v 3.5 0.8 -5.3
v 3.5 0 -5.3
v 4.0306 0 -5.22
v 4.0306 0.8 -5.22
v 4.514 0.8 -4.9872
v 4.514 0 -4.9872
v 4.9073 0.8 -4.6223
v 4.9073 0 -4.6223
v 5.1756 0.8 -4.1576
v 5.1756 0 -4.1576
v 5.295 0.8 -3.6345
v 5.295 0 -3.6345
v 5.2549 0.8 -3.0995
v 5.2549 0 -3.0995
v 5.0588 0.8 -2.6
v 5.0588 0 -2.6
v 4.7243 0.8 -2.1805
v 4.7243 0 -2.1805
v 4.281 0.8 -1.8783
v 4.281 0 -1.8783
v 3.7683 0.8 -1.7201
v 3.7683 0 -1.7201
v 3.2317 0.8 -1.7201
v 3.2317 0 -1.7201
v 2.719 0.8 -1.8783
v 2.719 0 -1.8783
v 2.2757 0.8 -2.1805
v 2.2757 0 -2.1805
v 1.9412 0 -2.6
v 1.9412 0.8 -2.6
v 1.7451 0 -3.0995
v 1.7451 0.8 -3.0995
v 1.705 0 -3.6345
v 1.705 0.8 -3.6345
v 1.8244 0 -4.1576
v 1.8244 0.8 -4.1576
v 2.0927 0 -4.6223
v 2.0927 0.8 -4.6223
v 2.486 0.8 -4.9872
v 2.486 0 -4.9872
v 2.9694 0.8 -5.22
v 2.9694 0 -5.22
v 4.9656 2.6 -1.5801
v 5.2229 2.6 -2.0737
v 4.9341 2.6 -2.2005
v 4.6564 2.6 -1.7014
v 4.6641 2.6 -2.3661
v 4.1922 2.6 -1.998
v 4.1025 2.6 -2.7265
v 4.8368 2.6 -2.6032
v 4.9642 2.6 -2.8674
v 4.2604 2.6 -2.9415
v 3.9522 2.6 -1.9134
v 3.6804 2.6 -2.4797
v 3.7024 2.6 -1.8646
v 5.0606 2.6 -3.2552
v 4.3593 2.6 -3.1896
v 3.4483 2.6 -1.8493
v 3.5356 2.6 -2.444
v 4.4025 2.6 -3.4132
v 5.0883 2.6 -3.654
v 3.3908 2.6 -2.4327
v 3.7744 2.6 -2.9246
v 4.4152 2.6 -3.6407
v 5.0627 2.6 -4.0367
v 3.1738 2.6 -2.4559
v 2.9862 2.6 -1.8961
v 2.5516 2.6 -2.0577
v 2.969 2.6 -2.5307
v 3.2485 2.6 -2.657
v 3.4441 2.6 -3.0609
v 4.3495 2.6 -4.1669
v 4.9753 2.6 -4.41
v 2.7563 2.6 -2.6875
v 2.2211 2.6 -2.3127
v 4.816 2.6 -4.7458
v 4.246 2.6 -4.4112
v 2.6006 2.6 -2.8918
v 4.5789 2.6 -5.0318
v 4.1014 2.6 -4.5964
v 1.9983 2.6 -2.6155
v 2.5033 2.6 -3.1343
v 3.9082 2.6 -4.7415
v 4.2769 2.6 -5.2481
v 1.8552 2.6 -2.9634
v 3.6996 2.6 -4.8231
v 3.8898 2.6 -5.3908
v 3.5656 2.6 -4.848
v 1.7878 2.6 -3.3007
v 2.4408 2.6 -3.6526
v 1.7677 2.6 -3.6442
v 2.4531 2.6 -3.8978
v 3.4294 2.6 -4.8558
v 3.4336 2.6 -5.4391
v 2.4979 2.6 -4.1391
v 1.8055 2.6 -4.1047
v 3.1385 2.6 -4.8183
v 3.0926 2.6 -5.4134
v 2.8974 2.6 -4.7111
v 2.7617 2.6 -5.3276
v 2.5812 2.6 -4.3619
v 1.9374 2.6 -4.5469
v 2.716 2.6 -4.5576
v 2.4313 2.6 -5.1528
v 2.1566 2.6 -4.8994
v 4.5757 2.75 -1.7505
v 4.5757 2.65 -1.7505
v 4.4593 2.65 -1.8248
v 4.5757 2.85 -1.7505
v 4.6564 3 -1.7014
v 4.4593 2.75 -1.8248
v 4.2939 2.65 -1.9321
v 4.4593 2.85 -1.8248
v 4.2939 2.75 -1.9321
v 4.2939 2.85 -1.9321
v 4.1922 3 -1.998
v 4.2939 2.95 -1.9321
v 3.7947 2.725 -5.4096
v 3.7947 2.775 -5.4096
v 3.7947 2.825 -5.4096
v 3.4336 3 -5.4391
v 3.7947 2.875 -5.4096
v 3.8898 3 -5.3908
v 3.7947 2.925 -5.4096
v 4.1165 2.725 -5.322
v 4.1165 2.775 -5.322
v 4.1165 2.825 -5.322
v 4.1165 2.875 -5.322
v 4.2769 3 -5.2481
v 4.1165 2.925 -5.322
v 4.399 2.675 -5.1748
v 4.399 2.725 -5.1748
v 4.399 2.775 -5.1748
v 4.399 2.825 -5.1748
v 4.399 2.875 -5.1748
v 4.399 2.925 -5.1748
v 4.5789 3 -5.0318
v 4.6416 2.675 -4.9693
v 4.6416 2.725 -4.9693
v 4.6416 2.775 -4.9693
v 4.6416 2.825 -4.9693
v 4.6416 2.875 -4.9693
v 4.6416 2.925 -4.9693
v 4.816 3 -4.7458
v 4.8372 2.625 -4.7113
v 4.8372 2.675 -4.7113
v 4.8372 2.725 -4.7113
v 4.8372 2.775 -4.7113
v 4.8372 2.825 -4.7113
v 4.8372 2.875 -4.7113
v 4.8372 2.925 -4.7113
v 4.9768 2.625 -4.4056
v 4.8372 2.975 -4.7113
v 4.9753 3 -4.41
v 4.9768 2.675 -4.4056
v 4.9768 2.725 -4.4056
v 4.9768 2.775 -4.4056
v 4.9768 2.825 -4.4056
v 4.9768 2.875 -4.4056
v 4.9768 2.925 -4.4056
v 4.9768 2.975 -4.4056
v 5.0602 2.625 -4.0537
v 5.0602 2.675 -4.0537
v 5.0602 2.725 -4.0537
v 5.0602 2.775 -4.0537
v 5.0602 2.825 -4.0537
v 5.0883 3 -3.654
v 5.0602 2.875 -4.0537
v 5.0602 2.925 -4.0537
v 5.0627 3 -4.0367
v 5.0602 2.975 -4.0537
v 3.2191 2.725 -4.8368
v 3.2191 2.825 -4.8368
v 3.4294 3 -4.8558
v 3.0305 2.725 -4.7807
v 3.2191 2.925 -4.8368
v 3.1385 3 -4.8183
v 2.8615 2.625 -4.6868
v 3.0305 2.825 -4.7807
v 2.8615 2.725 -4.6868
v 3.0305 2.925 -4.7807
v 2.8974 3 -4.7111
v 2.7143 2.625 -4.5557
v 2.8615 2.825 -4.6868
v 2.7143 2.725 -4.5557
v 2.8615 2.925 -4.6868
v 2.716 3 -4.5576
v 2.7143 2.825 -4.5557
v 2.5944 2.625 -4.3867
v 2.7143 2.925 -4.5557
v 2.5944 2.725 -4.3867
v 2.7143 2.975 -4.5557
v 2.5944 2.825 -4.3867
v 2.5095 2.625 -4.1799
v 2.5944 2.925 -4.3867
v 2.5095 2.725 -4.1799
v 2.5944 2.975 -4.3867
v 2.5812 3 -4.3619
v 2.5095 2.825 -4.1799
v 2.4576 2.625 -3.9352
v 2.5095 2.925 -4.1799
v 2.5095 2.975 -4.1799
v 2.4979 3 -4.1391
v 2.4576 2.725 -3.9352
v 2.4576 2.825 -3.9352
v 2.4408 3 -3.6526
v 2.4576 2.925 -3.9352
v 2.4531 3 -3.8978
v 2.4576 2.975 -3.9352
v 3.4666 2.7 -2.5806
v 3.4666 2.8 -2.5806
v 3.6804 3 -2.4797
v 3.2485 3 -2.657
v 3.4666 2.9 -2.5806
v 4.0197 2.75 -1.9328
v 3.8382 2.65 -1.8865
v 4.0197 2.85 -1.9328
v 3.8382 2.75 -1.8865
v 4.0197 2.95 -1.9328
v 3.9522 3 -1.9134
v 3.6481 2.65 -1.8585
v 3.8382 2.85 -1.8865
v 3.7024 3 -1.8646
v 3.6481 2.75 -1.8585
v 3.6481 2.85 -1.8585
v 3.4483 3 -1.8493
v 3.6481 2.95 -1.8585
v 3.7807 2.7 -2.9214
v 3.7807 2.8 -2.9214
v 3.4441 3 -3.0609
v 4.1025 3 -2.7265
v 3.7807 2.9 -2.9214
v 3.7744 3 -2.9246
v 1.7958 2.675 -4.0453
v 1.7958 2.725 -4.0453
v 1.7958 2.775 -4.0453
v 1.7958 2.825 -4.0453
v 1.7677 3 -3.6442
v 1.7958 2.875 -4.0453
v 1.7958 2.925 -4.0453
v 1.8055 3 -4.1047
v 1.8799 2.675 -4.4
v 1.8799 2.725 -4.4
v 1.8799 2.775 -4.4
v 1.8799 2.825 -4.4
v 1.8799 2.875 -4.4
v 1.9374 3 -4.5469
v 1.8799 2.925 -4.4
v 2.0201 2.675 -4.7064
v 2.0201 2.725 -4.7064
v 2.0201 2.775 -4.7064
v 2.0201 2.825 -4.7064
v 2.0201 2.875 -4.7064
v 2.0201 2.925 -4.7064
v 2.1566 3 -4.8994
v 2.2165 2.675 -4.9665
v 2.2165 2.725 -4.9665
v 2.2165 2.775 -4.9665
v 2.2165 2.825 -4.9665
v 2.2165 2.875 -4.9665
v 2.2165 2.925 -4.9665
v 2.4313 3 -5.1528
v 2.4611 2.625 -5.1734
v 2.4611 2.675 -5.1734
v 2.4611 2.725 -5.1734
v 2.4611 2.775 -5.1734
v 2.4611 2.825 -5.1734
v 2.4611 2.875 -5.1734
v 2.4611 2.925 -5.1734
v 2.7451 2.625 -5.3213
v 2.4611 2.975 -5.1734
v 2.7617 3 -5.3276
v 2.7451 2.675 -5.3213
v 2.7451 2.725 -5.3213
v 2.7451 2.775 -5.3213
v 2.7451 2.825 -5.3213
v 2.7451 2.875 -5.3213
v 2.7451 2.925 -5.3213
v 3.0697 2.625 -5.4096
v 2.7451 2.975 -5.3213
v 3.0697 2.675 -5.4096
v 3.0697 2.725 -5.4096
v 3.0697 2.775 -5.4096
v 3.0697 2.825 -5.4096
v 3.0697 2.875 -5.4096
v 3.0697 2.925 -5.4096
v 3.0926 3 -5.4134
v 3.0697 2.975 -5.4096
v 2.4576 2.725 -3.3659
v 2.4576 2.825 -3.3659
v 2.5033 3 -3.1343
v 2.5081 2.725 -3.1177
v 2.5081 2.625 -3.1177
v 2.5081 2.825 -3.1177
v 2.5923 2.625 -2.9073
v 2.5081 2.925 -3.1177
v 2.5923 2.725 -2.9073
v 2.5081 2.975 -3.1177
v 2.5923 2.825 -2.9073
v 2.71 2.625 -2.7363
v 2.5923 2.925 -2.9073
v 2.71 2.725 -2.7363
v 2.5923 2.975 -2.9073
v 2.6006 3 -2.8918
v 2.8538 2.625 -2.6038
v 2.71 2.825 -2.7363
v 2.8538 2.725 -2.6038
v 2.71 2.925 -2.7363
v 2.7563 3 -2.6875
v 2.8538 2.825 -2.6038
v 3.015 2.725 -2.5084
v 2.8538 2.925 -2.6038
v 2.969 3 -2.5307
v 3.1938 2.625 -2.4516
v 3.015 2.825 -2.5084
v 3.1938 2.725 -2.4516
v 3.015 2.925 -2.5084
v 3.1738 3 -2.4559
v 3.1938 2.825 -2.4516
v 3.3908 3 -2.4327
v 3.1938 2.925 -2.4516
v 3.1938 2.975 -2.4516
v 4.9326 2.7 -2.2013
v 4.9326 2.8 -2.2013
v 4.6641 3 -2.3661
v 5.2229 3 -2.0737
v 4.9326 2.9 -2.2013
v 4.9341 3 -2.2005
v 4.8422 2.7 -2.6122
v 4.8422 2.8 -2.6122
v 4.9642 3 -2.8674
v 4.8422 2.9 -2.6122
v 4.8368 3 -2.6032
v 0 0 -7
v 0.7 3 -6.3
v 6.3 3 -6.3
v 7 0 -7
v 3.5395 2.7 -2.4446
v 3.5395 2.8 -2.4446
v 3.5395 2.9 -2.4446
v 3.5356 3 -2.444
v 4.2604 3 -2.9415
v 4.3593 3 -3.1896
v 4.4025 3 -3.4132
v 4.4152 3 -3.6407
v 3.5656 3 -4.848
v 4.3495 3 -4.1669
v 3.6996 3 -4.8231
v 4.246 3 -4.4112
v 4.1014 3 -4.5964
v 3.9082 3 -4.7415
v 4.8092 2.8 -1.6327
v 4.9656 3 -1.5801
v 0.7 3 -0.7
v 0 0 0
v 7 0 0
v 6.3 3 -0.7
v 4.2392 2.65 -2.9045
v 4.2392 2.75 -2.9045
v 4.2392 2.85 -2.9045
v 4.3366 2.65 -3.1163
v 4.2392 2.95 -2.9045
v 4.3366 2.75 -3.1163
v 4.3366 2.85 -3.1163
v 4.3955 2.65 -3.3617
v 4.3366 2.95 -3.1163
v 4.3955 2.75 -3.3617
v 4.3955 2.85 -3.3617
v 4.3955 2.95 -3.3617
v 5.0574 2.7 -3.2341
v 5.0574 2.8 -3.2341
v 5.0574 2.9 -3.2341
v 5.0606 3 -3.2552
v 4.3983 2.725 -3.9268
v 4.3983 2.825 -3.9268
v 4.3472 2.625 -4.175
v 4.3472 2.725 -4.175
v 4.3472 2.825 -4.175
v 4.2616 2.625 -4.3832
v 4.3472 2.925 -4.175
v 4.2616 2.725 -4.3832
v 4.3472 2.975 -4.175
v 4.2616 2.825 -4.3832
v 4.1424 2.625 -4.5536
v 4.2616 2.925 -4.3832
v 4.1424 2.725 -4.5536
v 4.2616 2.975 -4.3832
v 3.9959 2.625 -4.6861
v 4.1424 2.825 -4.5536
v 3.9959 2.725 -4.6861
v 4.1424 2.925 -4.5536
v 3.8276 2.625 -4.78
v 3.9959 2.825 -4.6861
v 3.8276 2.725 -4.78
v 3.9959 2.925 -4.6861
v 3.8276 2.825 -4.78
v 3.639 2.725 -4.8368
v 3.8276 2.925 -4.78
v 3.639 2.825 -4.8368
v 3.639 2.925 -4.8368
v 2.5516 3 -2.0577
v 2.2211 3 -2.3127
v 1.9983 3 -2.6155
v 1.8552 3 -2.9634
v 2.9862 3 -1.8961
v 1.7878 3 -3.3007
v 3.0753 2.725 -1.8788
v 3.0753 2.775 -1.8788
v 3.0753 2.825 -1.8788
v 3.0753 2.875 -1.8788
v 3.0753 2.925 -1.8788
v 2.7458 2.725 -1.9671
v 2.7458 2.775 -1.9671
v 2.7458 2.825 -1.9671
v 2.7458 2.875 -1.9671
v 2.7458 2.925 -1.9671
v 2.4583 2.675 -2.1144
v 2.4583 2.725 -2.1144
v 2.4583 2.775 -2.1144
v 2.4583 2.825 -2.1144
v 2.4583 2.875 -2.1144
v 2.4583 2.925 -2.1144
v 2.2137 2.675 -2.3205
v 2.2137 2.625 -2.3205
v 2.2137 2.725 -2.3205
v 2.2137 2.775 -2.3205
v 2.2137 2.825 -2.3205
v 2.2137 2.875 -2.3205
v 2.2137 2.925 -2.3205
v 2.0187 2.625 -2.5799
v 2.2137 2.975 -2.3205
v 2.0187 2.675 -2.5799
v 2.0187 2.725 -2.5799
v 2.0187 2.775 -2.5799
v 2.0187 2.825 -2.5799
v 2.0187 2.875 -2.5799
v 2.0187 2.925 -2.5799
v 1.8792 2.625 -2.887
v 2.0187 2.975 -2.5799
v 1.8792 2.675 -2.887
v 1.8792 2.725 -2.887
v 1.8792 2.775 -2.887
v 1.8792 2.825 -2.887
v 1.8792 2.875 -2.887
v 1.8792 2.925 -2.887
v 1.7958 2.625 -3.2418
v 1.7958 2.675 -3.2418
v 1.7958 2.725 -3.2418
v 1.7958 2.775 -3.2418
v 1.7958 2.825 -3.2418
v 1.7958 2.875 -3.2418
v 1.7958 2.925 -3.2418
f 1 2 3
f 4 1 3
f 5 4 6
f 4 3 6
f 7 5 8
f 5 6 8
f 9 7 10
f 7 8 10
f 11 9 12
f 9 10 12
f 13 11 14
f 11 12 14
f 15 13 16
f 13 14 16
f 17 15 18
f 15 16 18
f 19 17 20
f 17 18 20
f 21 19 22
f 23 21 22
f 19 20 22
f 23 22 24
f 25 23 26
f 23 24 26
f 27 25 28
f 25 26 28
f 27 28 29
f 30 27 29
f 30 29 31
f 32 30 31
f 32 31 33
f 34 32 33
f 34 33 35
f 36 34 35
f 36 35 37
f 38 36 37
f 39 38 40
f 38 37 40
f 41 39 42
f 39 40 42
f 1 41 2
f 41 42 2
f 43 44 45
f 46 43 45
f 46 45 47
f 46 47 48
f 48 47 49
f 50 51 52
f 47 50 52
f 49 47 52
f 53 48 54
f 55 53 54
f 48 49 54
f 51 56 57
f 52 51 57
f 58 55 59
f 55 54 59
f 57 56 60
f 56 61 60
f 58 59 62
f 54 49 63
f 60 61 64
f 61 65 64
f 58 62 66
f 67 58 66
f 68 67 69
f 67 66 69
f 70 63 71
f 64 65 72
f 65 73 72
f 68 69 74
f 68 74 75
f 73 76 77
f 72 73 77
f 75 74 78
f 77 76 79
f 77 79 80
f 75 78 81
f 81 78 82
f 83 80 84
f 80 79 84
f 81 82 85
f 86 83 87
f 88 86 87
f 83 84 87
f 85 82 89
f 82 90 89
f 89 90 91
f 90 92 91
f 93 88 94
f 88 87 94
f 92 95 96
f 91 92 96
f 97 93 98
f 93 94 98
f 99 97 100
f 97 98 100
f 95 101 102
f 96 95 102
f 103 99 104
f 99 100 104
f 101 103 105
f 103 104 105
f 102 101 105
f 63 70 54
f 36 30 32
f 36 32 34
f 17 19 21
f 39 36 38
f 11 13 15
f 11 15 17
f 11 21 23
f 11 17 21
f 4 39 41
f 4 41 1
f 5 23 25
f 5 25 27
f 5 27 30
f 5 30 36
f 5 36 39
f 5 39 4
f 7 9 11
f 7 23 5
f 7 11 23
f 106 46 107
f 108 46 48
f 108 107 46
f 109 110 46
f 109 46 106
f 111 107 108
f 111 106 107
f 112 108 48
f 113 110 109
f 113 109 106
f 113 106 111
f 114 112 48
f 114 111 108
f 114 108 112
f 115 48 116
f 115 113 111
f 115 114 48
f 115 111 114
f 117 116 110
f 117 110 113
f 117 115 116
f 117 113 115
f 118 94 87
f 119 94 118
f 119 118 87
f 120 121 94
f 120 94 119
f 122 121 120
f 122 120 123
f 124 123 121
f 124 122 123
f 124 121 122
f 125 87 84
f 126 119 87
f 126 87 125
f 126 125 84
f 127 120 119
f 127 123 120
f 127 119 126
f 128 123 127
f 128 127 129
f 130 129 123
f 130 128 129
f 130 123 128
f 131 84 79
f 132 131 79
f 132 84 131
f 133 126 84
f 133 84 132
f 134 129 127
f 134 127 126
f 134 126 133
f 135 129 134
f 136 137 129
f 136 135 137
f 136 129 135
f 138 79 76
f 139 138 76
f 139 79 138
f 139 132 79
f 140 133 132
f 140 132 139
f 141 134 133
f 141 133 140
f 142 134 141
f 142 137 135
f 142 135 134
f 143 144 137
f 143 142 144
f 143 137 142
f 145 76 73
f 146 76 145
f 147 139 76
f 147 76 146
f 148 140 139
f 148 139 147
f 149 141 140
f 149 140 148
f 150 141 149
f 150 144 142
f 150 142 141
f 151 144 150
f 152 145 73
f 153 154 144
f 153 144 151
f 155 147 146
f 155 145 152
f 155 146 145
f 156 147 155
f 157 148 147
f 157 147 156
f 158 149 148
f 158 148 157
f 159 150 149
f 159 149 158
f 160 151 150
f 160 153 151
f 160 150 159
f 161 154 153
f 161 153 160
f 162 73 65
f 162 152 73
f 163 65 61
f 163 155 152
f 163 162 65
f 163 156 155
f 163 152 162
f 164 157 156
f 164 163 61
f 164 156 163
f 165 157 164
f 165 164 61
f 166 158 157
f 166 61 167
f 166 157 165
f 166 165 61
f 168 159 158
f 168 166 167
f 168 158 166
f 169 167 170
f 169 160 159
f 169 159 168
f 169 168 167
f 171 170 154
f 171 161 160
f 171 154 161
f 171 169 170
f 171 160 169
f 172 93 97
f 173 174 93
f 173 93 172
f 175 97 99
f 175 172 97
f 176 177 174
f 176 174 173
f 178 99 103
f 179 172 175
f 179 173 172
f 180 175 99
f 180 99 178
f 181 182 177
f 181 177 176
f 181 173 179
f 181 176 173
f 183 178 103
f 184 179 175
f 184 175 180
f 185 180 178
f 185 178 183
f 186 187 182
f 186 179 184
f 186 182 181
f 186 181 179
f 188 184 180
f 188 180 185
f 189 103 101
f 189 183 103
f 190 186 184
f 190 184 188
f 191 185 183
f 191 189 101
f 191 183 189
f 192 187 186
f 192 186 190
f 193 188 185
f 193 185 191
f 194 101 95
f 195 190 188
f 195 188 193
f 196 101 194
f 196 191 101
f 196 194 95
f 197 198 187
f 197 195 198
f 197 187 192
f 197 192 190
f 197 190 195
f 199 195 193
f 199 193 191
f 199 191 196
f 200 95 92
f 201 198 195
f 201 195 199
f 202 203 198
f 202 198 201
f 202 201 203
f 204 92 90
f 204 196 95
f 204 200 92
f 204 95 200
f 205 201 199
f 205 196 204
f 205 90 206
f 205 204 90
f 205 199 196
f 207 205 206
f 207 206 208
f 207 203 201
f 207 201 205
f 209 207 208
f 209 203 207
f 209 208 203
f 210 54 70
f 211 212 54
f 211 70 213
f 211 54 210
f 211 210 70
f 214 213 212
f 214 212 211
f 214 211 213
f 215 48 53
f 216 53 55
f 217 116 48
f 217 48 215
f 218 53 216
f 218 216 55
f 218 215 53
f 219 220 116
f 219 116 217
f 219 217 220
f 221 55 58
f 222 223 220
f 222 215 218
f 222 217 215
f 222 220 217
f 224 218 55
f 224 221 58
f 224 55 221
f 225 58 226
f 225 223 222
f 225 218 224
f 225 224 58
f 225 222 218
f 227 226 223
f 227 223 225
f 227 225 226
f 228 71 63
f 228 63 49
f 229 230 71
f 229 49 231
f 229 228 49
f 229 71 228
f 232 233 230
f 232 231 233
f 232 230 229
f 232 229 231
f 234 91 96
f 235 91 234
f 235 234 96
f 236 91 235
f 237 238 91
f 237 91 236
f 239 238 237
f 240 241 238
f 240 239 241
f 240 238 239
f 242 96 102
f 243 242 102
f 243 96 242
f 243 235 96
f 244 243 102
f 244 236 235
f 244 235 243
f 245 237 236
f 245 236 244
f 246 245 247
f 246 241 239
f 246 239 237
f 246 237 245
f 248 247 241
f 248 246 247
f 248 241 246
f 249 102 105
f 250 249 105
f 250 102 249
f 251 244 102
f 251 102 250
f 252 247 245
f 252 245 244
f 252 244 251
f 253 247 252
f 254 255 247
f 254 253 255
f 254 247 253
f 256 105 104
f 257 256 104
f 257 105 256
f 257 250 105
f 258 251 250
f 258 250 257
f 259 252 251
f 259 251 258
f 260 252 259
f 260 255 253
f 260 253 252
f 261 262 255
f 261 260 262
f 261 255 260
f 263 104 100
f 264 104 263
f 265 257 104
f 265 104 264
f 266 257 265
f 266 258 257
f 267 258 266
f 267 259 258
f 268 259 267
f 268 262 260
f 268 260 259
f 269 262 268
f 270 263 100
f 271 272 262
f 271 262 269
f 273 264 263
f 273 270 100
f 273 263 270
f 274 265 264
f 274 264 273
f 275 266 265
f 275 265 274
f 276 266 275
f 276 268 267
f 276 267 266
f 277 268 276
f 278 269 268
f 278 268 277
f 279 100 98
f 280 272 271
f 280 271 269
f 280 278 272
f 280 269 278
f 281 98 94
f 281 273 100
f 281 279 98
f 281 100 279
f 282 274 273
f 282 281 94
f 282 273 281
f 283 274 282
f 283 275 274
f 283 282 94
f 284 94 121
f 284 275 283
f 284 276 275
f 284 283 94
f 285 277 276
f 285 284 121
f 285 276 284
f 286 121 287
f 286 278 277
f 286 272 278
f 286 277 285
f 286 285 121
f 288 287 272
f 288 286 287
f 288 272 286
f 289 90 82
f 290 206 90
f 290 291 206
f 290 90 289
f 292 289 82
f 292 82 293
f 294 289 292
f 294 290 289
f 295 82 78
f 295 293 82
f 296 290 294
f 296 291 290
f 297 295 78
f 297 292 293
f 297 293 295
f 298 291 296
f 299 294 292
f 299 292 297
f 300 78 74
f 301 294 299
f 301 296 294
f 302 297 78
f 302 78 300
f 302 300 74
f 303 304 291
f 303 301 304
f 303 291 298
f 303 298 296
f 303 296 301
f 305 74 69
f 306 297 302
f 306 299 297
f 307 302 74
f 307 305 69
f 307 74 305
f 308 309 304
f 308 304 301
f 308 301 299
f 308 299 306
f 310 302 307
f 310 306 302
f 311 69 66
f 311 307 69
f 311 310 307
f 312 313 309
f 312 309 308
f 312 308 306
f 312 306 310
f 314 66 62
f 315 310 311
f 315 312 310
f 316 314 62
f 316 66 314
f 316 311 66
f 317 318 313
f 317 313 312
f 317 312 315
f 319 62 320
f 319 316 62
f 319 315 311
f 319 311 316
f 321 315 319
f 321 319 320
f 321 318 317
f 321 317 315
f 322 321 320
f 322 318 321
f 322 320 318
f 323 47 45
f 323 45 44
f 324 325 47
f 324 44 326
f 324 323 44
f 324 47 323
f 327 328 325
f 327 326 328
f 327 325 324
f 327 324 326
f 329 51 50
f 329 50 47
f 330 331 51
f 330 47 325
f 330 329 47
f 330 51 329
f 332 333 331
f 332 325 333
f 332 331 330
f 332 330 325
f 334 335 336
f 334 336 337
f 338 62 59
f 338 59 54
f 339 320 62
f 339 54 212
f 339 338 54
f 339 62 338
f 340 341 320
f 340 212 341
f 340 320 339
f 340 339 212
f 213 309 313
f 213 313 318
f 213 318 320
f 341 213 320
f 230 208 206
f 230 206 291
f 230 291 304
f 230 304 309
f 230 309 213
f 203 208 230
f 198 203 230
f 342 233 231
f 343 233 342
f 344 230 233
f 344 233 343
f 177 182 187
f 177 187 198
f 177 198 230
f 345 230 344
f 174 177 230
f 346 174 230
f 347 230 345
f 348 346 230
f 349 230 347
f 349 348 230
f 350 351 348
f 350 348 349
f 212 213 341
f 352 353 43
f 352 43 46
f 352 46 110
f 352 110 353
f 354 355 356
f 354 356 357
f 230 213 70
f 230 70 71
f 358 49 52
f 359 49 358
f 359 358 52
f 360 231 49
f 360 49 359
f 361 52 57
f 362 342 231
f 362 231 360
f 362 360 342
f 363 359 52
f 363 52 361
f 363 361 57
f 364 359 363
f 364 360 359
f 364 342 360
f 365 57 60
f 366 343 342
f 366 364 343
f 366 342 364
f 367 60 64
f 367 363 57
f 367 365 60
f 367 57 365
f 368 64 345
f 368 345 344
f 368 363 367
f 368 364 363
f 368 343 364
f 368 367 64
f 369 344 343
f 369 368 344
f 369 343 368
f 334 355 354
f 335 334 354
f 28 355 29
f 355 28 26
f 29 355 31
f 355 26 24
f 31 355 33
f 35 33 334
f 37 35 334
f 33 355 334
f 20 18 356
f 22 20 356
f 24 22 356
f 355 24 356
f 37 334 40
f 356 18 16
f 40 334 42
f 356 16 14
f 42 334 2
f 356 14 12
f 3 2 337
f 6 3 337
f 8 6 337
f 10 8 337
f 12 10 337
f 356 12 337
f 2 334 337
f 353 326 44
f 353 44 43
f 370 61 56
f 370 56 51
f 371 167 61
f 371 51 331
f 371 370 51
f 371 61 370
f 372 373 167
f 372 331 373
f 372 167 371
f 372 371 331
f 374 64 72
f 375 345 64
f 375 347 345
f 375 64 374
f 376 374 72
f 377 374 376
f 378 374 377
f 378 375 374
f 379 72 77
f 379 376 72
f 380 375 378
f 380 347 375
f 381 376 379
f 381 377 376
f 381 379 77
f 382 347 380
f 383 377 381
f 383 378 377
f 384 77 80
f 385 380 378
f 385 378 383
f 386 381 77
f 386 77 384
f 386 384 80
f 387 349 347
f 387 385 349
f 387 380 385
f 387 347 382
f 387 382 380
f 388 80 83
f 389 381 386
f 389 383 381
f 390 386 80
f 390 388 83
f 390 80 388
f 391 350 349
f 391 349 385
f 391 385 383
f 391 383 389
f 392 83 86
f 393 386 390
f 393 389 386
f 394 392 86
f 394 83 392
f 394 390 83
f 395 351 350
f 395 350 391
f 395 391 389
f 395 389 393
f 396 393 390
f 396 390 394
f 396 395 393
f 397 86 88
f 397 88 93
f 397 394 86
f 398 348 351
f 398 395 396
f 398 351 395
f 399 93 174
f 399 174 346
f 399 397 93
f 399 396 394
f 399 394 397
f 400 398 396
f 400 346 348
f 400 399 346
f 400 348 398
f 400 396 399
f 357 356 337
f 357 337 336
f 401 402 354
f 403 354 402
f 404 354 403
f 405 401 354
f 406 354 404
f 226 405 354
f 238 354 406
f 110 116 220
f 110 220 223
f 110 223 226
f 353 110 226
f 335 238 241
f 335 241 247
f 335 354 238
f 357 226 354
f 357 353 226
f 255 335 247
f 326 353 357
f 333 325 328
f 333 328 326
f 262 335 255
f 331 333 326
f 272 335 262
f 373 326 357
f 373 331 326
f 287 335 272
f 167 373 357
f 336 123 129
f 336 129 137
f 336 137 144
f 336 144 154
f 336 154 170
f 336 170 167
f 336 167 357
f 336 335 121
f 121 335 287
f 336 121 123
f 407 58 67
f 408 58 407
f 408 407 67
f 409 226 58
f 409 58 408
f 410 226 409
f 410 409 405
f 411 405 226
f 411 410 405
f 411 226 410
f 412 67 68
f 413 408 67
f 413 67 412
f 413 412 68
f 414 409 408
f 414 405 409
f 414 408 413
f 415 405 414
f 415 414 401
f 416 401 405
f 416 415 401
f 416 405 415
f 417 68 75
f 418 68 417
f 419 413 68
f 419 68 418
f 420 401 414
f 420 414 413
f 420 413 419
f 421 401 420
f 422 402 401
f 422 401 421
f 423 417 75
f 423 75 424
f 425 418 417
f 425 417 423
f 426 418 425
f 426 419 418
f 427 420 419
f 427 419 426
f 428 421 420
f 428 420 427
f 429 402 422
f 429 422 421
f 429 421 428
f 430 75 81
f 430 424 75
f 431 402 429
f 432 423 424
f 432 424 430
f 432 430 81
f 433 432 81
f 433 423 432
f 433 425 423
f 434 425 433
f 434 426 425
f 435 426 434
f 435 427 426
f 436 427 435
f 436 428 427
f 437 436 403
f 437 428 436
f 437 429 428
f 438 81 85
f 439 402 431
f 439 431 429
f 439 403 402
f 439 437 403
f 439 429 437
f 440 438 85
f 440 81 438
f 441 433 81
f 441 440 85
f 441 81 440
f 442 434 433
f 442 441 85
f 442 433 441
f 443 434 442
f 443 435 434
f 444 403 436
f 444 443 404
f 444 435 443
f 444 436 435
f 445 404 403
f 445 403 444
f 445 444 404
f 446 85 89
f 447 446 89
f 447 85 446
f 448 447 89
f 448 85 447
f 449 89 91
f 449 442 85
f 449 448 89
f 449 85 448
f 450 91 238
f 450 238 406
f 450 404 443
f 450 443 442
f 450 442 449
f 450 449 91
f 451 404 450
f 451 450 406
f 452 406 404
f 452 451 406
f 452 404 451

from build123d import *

# Parameters (mm, degrees)
SKETCH1_W           = 7
SKETCH1_H           = 7
BOSS_EXTRUDE1_DEPTH = 3
CUT_EXTRUDE1_DEPTH  = 7
CUT_EXTRUDE2_DEPTH  = 11
SKETCH4_R           = 1.8
CUT_EXTRUDE3_DEPTH  = 0.8
CUT_EXTRUDE4_DEPTH  = 0.4


with BuildPart() as part:
    # Sketch1 → Boss-Extrude1 (new body)
    with BuildSketch(Plane(origin=(0, 0, 0), x_dir=(1, 0, 0), z_dir=(0, 1, 0))):
        with Locations((3.5, 3.5)):
            Rectangle(SKETCH1_W, SKETCH1_H)
    extrude(amount=BOSS_EXTRUDE1_DEPTH)

    # Sketch2 → Cut-Extrude1 (cut)
    with BuildSketch(Plane.XY):
        Polygon((0, 0), (0.7, 3), (0, 3), align=None)
        Polygon((7, 0), (6.3, 3), (7, 3), align=None)
    extrude(amount=-CUT_EXTRUDE1_DEPTH, mode=Mode.SUBTRACT)

    # Sketch3 → Cut-Extrude2 (cut)
    with BuildSketch(Plane(origin=(0, 0, 0), x_dir=(0, 0, -1), z_dir=(1, 0, 0))):
        Polygon((0, 0), (0.7, 3), (0, 3), align=None)
        Polygon((7, 3), (6.3, 3), (7, 0), align=None)
    extrude(amount=CUT_EXTRUDE2_DEPTH, mode=Mode.SUBTRACT)

    # Sketch4 → Cut-Extrude3 (cut)
    with BuildSketch(Plane.XZ):
        with Locations(Location((3.5, -3.5, 0), (0, 0, 270))):
            Circle(SKETCH4_R)
    extrude(amount=-CUT_EXTRUDE3_DEPTH, mode=Mode.SUBTRACT)

    # Sketch6 → Cut-Extrude4 (cut)
    with BuildSketch(Plane(origin=(0, 3, 0), x_dir=(1, 0, 0), z_dir=(0, 1, 0))):
        with BuildLine():
            add(Edge.make_bspline(
                [(4.664072496, 2.366076672), (4.707347841, 2.33641431), (4.79406668, 2.276974329), (4.932000881, 2.200081193), (5.074319859, 2.130177652), (5.173227993, 2.092578566), (5.222866567, 2.073708884)],
                knots=[0, 0, 0, 0, 0.994855506, 1.99357661, 2.993045438, 4, 4, 4, 4], degree=3))
            Line((5.222866567, 2.073708884), (4.965554868, 1.58011914))
            add(Edge.make_bspline(
                [(4.965554868, 1.58011914), (4.912950568, 1.596402863), (4.806905677, 1.629229182), (4.706805134, 1.677225698), (4.656360157, 1.701413211)],
                knots=[0, 0, 0, 0, 0.992113803, 2, 2, 2, 2], degree=3))
            add(Edge.make_bspline(
                [(4.656360157, 1.701413211), (4.651410026, 1.703910751), (4.637075112, 1.711143291), (4.611037723, 1.728948088), (4.571310996, 1.752945912), (4.519597577, 1.786185947), (4.455377063, 1.827387082), (4.378441674, 1.876504864), (4.289852424, 1.934928076), (4.2261424, 1.976076602), (4.192217528, 1.99798773)],
                knots=[0, 0, 0, 0, 0.241377655, 0.698997227, 1.371388316, 2.263975901, 3.376788369, 4.695767198, 6.240533187, 8, 8, 8, 8], degree=3))
            add(Edge.make_bspline(
                [(4.192217528, 1.99798773), (4.164082126, 1.985938608), (4.107539341, 1.961723888), (4.019810769, 1.931906785), (3.929851311, 1.906788839), (3.83798057, 1.88548719), (3.743809701, 1.869659434), (3.647471832, 1.857521371), (3.548696902, 1.85040295), (3.481992412, 1.849703111), (3.448327304, 1.849349909)],
                knots=[0, 0, 0, 0, 0.961025642, 1.931341354, 2.907359807, 3.893838693, 4.891829695, 5.905170566, 6.942759923, 8, 8, 8, 8], degree=3))
            add(Edge.make_bspline(
                [(3.448327304, 1.849349909), (3.384469015, 1.850904143), (3.259644276, 1.853942228), (3.077633843, 1.87547395), (2.906612989, 1.912794393), (2.745831056, 1.96377118), (2.596254532, 2.030691184), (2.456571284, 2.111582166), (2.328715231, 2.208542848), (2.210924756, 2.318601555), (2.106714068, 2.44299724), (2.01548492, 2.579558487), (1.938201438, 2.727832608), (1.87588476, 2.888600431), (1.826634495, 3.060561995), (1.793056062, 3.244931239), (1.771444669, 3.440614719), (1.768994453, 3.575218022), (1.767738362, 3.644221704)],
                knots=[0, 0, 0, 0, 1.098101164, 2.146474535, 3.146072545, 4.104420533, 5.041773038, 5.958565538, 6.874115049, 7.795336865, 8.725215067, 9.658214839, 10.614563411, 11.594512188, 12.618591104, 13.685899083, 14.813688224, 16, 16, 16, 16], degree=3))
            add(Edge.make_bspline(
                [(1.767738362, 3.644221704), (1.768997302, 3.713222571), (1.771444596, 3.847355546), (1.7929084, 4.042662021), (1.827606571, 4.226372552), (1.876354652, 4.398607362), (1.939604685, 4.558913945), (2.017190294, 4.707202518), (2.10856287, 4.844051901), (2.214008903, 4.968173308), (2.331174894, 5.079358291), (2.459402401, 5.175598306), (2.597200561, 5.257768614), (2.745117273, 5.324625417), (2.903560867, 5.375574114), (3.071324913, 5.412775744), (3.249338156, 5.434570742), (3.371143561, 5.437560428), (3.433603746, 5.439093499)],
                knots=[0, 0, 0, 0, 1.193283781, 2.319662245, 3.393996131, 4.424093603, 5.411284417, 6.369670503, 7.313761776, 8.251713527, 9.181123148, 10.102053383, 11.01932051, 11.951118596, 12.903560284, 13.893239571, 14.919681386, 16, 16, 16, 16], degree=3))
            add(Edge.make_bspline(
                [(3.433603746, 5.439093499), (3.495615312, 5.437966268), (3.616563704, 5.435767699), (3.79292347, 5.412253487), (3.95956776, 5.376576627), (4.116694799, 5.325148401), (4.263499528, 5.258359333), (4.400745959, 5.177269062), (4.527633661, 5.081192592), (4.644198547, 4.971068574), (4.748454019, 4.847375423), (4.840809815, 4.712147514), (4.916635875, 4.563717786), (4.980514643, 4.404604546), (5.028132934, 4.233255975), (5.063284912, 4.050654395), (5.084451249, 3.856224461), (5.08696323, 3.722566855), (5.088251182, 3.654037409)],
                knots=[0, 0, 0, 0, 1.078752742, 2.104017338, 3.091035458, 4.041673215, 4.975566109, 5.892967701, 6.810684895, 7.740128604, 8.678185021, 9.621404646, 10.583875016, 11.573429805, 12.6009998, 13.674031063, 14.80742018, 16, 16, 16, 16], degree=3))
            add(Edge.make_bspline(
                [(5.088251182, 3.654037409), (5.086861856, 3.58175257), (5.084161048, 3.441232998), (5.060656035, 3.237166867), (5.02255362, 3.046054473), (4.983299325, 2.925957386), (4.964152625, 2.867378755)],
                knots=[0, 0, 0, 0, 1.083667057, 2.106616435, 3.076482036, 4, 4, 4, 4], degree=3))
            add(Edge.make_bspline(
                [(4.964152625, 2.867378755), (4.946989265, 2.824230782), (4.912073515, 2.73645404), (4.84305787, 2.609753708), (4.760943187, 2.484753896), (4.696820471, 2.406196533), (4.664072496, 2.366076672)],
                knots=[0, 0, 0, 0, 0.948216854, 1.928975575, 2.942311585, 4, 4, 4, 4], degree=3))
        make_face()
        with BuildLine():
            add(Edge.make_bspline(
                [(4.102473939, 2.726453275), (4.127780012, 2.754119398), (4.178452724, 2.809517857), (4.241114406, 2.90440552), (4.295822593, 3.006161549), (4.338835309, 3.117324632), (4.373428663, 3.236201997), (4.397571905, 3.363677482), (4.412566656, 3.499430632), (4.414289266, 3.592765315), (4.415174259, 3.640716095)],
                knots=[0, 0, 0, 0, 0.906820982, 1.815812261, 2.745108282, 3.70056618, 4.696560745, 5.740060838, 6.83895416, 8, 8, 8, 8], degree=3))
            add(Edge.make_bspline(
                [(4.415174259, 3.640716095), (4.414398079, 3.690052691), (4.412894495, 3.785625555), (4.400440515, 3.924411083), (4.378524584, 4.053416848), (4.349921684, 4.173180965), (4.310950729, 4.282734101), (4.263951968, 4.382902013), (4.208851462, 4.473931164), (4.144295177, 4.554319676), (4.073289316, 4.624992614), (3.997385018, 4.687424679), (3.915473431, 4.739684176), (3.827971743, 4.781723701), (3.735612195, 4.814802537), (3.638175965, 4.838817015), (3.53544327, 4.852870135), (3.465197405, 4.854784514), (3.429397016, 4.855760166)],
                knots=[0, 0, 0, 0, 1.335693338, 2.587451293, 3.768164612, 4.876224393, 5.916940853, 6.910477009, 7.867661778, 8.790666633, 9.694493319, 10.576027549, 11.446684429, 12.318352473, 13.199023277, 14.098364444, 15.030842682, 16, 16, 16, 16], degree=3))
            add(Edge.make_bspline(
                [(3.429397016, 4.855760166), (3.393356942, 4.854816175), (3.322865485, 4.852969805), (3.220031689, 4.838575915), (3.122373109, 4.815718183), (3.030128831, 4.782378038), (2.942464926, 4.740258761), (2.860247279, 4.688096064), (2.783487349, 4.626644322), (2.712123891, 4.556417609), (2.648385937, 4.476003653), (2.59172793, 4.38655956), (2.54488942, 4.287055852), (2.507276462, 4.178050834), (2.47721761, 4.060104683), (2.455571683, 3.932584455), (2.443101443, 3.795681707), (2.4415926, 3.701272351), (2.440815285, 3.652635166)],
                knots=[0, 0, 0, 0, 0.980107447, 1.917010591, 2.819119613, 3.703969481, 4.579773866, 5.459928929, 6.346604172, 7.250235365, 8.177620171, 9.131899985, 10.124404622, 11.161948974, 12.264485933, 13.431998172, 14.677033863, 16, 16, 16, 16], degree=3))
            add(Edge.make_bspline(
                [(2.440815285, 3.652635166), (2.441573469, 3.603294377), (2.44304577, 3.507480607), (2.45578752, 3.368559232), (2.476444238, 3.239125728), (2.505849447, 3.119233667), (2.543445207, 3.008746086), (2.589753063, 2.907816949), (2.64452751, 2.816572472), (2.707944858, 2.735840547), (2.77770996, 2.664816022), (2.852256943, 2.602898033), (2.930980725, 2.549856537), (3.014248538, 2.506760434), (3.102082714, 2.473663846), (3.194176957, 2.449777413), (3.291067215, 2.435539876), (3.35713374, 2.433648211), (3.390835317, 2.432683243)],
                knots=[0, 0, 0, 0, 1.356840463, 2.634818045, 3.833173645, 4.958776583, 6.025986406, 7.038359119, 8.007356852, 8.946032033, 9.855123386, 10.740685277, 11.607120956, 12.460971081, 13.313368256, 14.183325659, 15.073285775, 16, 16, 16, 16], degree=3))
            add(Edge.make_bspline(
                [(3.390835317, 2.432683243), (3.416109581, 2.433126684), (3.465894623, 2.43400017), (3.53944648, 2.443818905), (3.611093649, 2.458013111), (3.65736983, 2.472466064), (3.680398618, 2.479658403)],
                knots=[0, 0, 0, 0, 1.028828871, 2.026578908, 3.017950568, 4, 4, 4, 4], degree=3))
            add(Edge.make_bspline(
                [(3.680398618, 2.479658403), (3.645092364, 2.498106364), (3.575176857, 2.534638095), (3.467084084, 2.581186178), (3.358775331, 2.62312493), (3.28511213, 2.645783016), (3.248507593, 2.657042217)],
                knots=[0, 0, 0, 0, 1.021704821, 2.023239566, 3.017713044, 4, 4, 4, 4], degree=3))
            Line((3.248507593, 2.657042217), (3.444120573, 3.060888371))
            add(Edge.make_bspline(
                [(3.444120573, 3.060888371), (3.501325249, 3.041120096), (3.616286729, 3.001392746), (3.7823537, 2.92250788), (3.946106427, 2.832725945), (4.049959461, 2.762143896), (4.102473939, 2.726453275)],
                knots=[0, 0, 0, 0, 0.979271047, 1.967993817, 2.972492781, 4, 4, 4, 4], degree=3))
        make_face(mode=Mode.SUBTRACT)
    extrude(amount=-CUT_EXTRUDE4_DEPTH, mode=Mode.SUBTRACT)


solid = part.part
